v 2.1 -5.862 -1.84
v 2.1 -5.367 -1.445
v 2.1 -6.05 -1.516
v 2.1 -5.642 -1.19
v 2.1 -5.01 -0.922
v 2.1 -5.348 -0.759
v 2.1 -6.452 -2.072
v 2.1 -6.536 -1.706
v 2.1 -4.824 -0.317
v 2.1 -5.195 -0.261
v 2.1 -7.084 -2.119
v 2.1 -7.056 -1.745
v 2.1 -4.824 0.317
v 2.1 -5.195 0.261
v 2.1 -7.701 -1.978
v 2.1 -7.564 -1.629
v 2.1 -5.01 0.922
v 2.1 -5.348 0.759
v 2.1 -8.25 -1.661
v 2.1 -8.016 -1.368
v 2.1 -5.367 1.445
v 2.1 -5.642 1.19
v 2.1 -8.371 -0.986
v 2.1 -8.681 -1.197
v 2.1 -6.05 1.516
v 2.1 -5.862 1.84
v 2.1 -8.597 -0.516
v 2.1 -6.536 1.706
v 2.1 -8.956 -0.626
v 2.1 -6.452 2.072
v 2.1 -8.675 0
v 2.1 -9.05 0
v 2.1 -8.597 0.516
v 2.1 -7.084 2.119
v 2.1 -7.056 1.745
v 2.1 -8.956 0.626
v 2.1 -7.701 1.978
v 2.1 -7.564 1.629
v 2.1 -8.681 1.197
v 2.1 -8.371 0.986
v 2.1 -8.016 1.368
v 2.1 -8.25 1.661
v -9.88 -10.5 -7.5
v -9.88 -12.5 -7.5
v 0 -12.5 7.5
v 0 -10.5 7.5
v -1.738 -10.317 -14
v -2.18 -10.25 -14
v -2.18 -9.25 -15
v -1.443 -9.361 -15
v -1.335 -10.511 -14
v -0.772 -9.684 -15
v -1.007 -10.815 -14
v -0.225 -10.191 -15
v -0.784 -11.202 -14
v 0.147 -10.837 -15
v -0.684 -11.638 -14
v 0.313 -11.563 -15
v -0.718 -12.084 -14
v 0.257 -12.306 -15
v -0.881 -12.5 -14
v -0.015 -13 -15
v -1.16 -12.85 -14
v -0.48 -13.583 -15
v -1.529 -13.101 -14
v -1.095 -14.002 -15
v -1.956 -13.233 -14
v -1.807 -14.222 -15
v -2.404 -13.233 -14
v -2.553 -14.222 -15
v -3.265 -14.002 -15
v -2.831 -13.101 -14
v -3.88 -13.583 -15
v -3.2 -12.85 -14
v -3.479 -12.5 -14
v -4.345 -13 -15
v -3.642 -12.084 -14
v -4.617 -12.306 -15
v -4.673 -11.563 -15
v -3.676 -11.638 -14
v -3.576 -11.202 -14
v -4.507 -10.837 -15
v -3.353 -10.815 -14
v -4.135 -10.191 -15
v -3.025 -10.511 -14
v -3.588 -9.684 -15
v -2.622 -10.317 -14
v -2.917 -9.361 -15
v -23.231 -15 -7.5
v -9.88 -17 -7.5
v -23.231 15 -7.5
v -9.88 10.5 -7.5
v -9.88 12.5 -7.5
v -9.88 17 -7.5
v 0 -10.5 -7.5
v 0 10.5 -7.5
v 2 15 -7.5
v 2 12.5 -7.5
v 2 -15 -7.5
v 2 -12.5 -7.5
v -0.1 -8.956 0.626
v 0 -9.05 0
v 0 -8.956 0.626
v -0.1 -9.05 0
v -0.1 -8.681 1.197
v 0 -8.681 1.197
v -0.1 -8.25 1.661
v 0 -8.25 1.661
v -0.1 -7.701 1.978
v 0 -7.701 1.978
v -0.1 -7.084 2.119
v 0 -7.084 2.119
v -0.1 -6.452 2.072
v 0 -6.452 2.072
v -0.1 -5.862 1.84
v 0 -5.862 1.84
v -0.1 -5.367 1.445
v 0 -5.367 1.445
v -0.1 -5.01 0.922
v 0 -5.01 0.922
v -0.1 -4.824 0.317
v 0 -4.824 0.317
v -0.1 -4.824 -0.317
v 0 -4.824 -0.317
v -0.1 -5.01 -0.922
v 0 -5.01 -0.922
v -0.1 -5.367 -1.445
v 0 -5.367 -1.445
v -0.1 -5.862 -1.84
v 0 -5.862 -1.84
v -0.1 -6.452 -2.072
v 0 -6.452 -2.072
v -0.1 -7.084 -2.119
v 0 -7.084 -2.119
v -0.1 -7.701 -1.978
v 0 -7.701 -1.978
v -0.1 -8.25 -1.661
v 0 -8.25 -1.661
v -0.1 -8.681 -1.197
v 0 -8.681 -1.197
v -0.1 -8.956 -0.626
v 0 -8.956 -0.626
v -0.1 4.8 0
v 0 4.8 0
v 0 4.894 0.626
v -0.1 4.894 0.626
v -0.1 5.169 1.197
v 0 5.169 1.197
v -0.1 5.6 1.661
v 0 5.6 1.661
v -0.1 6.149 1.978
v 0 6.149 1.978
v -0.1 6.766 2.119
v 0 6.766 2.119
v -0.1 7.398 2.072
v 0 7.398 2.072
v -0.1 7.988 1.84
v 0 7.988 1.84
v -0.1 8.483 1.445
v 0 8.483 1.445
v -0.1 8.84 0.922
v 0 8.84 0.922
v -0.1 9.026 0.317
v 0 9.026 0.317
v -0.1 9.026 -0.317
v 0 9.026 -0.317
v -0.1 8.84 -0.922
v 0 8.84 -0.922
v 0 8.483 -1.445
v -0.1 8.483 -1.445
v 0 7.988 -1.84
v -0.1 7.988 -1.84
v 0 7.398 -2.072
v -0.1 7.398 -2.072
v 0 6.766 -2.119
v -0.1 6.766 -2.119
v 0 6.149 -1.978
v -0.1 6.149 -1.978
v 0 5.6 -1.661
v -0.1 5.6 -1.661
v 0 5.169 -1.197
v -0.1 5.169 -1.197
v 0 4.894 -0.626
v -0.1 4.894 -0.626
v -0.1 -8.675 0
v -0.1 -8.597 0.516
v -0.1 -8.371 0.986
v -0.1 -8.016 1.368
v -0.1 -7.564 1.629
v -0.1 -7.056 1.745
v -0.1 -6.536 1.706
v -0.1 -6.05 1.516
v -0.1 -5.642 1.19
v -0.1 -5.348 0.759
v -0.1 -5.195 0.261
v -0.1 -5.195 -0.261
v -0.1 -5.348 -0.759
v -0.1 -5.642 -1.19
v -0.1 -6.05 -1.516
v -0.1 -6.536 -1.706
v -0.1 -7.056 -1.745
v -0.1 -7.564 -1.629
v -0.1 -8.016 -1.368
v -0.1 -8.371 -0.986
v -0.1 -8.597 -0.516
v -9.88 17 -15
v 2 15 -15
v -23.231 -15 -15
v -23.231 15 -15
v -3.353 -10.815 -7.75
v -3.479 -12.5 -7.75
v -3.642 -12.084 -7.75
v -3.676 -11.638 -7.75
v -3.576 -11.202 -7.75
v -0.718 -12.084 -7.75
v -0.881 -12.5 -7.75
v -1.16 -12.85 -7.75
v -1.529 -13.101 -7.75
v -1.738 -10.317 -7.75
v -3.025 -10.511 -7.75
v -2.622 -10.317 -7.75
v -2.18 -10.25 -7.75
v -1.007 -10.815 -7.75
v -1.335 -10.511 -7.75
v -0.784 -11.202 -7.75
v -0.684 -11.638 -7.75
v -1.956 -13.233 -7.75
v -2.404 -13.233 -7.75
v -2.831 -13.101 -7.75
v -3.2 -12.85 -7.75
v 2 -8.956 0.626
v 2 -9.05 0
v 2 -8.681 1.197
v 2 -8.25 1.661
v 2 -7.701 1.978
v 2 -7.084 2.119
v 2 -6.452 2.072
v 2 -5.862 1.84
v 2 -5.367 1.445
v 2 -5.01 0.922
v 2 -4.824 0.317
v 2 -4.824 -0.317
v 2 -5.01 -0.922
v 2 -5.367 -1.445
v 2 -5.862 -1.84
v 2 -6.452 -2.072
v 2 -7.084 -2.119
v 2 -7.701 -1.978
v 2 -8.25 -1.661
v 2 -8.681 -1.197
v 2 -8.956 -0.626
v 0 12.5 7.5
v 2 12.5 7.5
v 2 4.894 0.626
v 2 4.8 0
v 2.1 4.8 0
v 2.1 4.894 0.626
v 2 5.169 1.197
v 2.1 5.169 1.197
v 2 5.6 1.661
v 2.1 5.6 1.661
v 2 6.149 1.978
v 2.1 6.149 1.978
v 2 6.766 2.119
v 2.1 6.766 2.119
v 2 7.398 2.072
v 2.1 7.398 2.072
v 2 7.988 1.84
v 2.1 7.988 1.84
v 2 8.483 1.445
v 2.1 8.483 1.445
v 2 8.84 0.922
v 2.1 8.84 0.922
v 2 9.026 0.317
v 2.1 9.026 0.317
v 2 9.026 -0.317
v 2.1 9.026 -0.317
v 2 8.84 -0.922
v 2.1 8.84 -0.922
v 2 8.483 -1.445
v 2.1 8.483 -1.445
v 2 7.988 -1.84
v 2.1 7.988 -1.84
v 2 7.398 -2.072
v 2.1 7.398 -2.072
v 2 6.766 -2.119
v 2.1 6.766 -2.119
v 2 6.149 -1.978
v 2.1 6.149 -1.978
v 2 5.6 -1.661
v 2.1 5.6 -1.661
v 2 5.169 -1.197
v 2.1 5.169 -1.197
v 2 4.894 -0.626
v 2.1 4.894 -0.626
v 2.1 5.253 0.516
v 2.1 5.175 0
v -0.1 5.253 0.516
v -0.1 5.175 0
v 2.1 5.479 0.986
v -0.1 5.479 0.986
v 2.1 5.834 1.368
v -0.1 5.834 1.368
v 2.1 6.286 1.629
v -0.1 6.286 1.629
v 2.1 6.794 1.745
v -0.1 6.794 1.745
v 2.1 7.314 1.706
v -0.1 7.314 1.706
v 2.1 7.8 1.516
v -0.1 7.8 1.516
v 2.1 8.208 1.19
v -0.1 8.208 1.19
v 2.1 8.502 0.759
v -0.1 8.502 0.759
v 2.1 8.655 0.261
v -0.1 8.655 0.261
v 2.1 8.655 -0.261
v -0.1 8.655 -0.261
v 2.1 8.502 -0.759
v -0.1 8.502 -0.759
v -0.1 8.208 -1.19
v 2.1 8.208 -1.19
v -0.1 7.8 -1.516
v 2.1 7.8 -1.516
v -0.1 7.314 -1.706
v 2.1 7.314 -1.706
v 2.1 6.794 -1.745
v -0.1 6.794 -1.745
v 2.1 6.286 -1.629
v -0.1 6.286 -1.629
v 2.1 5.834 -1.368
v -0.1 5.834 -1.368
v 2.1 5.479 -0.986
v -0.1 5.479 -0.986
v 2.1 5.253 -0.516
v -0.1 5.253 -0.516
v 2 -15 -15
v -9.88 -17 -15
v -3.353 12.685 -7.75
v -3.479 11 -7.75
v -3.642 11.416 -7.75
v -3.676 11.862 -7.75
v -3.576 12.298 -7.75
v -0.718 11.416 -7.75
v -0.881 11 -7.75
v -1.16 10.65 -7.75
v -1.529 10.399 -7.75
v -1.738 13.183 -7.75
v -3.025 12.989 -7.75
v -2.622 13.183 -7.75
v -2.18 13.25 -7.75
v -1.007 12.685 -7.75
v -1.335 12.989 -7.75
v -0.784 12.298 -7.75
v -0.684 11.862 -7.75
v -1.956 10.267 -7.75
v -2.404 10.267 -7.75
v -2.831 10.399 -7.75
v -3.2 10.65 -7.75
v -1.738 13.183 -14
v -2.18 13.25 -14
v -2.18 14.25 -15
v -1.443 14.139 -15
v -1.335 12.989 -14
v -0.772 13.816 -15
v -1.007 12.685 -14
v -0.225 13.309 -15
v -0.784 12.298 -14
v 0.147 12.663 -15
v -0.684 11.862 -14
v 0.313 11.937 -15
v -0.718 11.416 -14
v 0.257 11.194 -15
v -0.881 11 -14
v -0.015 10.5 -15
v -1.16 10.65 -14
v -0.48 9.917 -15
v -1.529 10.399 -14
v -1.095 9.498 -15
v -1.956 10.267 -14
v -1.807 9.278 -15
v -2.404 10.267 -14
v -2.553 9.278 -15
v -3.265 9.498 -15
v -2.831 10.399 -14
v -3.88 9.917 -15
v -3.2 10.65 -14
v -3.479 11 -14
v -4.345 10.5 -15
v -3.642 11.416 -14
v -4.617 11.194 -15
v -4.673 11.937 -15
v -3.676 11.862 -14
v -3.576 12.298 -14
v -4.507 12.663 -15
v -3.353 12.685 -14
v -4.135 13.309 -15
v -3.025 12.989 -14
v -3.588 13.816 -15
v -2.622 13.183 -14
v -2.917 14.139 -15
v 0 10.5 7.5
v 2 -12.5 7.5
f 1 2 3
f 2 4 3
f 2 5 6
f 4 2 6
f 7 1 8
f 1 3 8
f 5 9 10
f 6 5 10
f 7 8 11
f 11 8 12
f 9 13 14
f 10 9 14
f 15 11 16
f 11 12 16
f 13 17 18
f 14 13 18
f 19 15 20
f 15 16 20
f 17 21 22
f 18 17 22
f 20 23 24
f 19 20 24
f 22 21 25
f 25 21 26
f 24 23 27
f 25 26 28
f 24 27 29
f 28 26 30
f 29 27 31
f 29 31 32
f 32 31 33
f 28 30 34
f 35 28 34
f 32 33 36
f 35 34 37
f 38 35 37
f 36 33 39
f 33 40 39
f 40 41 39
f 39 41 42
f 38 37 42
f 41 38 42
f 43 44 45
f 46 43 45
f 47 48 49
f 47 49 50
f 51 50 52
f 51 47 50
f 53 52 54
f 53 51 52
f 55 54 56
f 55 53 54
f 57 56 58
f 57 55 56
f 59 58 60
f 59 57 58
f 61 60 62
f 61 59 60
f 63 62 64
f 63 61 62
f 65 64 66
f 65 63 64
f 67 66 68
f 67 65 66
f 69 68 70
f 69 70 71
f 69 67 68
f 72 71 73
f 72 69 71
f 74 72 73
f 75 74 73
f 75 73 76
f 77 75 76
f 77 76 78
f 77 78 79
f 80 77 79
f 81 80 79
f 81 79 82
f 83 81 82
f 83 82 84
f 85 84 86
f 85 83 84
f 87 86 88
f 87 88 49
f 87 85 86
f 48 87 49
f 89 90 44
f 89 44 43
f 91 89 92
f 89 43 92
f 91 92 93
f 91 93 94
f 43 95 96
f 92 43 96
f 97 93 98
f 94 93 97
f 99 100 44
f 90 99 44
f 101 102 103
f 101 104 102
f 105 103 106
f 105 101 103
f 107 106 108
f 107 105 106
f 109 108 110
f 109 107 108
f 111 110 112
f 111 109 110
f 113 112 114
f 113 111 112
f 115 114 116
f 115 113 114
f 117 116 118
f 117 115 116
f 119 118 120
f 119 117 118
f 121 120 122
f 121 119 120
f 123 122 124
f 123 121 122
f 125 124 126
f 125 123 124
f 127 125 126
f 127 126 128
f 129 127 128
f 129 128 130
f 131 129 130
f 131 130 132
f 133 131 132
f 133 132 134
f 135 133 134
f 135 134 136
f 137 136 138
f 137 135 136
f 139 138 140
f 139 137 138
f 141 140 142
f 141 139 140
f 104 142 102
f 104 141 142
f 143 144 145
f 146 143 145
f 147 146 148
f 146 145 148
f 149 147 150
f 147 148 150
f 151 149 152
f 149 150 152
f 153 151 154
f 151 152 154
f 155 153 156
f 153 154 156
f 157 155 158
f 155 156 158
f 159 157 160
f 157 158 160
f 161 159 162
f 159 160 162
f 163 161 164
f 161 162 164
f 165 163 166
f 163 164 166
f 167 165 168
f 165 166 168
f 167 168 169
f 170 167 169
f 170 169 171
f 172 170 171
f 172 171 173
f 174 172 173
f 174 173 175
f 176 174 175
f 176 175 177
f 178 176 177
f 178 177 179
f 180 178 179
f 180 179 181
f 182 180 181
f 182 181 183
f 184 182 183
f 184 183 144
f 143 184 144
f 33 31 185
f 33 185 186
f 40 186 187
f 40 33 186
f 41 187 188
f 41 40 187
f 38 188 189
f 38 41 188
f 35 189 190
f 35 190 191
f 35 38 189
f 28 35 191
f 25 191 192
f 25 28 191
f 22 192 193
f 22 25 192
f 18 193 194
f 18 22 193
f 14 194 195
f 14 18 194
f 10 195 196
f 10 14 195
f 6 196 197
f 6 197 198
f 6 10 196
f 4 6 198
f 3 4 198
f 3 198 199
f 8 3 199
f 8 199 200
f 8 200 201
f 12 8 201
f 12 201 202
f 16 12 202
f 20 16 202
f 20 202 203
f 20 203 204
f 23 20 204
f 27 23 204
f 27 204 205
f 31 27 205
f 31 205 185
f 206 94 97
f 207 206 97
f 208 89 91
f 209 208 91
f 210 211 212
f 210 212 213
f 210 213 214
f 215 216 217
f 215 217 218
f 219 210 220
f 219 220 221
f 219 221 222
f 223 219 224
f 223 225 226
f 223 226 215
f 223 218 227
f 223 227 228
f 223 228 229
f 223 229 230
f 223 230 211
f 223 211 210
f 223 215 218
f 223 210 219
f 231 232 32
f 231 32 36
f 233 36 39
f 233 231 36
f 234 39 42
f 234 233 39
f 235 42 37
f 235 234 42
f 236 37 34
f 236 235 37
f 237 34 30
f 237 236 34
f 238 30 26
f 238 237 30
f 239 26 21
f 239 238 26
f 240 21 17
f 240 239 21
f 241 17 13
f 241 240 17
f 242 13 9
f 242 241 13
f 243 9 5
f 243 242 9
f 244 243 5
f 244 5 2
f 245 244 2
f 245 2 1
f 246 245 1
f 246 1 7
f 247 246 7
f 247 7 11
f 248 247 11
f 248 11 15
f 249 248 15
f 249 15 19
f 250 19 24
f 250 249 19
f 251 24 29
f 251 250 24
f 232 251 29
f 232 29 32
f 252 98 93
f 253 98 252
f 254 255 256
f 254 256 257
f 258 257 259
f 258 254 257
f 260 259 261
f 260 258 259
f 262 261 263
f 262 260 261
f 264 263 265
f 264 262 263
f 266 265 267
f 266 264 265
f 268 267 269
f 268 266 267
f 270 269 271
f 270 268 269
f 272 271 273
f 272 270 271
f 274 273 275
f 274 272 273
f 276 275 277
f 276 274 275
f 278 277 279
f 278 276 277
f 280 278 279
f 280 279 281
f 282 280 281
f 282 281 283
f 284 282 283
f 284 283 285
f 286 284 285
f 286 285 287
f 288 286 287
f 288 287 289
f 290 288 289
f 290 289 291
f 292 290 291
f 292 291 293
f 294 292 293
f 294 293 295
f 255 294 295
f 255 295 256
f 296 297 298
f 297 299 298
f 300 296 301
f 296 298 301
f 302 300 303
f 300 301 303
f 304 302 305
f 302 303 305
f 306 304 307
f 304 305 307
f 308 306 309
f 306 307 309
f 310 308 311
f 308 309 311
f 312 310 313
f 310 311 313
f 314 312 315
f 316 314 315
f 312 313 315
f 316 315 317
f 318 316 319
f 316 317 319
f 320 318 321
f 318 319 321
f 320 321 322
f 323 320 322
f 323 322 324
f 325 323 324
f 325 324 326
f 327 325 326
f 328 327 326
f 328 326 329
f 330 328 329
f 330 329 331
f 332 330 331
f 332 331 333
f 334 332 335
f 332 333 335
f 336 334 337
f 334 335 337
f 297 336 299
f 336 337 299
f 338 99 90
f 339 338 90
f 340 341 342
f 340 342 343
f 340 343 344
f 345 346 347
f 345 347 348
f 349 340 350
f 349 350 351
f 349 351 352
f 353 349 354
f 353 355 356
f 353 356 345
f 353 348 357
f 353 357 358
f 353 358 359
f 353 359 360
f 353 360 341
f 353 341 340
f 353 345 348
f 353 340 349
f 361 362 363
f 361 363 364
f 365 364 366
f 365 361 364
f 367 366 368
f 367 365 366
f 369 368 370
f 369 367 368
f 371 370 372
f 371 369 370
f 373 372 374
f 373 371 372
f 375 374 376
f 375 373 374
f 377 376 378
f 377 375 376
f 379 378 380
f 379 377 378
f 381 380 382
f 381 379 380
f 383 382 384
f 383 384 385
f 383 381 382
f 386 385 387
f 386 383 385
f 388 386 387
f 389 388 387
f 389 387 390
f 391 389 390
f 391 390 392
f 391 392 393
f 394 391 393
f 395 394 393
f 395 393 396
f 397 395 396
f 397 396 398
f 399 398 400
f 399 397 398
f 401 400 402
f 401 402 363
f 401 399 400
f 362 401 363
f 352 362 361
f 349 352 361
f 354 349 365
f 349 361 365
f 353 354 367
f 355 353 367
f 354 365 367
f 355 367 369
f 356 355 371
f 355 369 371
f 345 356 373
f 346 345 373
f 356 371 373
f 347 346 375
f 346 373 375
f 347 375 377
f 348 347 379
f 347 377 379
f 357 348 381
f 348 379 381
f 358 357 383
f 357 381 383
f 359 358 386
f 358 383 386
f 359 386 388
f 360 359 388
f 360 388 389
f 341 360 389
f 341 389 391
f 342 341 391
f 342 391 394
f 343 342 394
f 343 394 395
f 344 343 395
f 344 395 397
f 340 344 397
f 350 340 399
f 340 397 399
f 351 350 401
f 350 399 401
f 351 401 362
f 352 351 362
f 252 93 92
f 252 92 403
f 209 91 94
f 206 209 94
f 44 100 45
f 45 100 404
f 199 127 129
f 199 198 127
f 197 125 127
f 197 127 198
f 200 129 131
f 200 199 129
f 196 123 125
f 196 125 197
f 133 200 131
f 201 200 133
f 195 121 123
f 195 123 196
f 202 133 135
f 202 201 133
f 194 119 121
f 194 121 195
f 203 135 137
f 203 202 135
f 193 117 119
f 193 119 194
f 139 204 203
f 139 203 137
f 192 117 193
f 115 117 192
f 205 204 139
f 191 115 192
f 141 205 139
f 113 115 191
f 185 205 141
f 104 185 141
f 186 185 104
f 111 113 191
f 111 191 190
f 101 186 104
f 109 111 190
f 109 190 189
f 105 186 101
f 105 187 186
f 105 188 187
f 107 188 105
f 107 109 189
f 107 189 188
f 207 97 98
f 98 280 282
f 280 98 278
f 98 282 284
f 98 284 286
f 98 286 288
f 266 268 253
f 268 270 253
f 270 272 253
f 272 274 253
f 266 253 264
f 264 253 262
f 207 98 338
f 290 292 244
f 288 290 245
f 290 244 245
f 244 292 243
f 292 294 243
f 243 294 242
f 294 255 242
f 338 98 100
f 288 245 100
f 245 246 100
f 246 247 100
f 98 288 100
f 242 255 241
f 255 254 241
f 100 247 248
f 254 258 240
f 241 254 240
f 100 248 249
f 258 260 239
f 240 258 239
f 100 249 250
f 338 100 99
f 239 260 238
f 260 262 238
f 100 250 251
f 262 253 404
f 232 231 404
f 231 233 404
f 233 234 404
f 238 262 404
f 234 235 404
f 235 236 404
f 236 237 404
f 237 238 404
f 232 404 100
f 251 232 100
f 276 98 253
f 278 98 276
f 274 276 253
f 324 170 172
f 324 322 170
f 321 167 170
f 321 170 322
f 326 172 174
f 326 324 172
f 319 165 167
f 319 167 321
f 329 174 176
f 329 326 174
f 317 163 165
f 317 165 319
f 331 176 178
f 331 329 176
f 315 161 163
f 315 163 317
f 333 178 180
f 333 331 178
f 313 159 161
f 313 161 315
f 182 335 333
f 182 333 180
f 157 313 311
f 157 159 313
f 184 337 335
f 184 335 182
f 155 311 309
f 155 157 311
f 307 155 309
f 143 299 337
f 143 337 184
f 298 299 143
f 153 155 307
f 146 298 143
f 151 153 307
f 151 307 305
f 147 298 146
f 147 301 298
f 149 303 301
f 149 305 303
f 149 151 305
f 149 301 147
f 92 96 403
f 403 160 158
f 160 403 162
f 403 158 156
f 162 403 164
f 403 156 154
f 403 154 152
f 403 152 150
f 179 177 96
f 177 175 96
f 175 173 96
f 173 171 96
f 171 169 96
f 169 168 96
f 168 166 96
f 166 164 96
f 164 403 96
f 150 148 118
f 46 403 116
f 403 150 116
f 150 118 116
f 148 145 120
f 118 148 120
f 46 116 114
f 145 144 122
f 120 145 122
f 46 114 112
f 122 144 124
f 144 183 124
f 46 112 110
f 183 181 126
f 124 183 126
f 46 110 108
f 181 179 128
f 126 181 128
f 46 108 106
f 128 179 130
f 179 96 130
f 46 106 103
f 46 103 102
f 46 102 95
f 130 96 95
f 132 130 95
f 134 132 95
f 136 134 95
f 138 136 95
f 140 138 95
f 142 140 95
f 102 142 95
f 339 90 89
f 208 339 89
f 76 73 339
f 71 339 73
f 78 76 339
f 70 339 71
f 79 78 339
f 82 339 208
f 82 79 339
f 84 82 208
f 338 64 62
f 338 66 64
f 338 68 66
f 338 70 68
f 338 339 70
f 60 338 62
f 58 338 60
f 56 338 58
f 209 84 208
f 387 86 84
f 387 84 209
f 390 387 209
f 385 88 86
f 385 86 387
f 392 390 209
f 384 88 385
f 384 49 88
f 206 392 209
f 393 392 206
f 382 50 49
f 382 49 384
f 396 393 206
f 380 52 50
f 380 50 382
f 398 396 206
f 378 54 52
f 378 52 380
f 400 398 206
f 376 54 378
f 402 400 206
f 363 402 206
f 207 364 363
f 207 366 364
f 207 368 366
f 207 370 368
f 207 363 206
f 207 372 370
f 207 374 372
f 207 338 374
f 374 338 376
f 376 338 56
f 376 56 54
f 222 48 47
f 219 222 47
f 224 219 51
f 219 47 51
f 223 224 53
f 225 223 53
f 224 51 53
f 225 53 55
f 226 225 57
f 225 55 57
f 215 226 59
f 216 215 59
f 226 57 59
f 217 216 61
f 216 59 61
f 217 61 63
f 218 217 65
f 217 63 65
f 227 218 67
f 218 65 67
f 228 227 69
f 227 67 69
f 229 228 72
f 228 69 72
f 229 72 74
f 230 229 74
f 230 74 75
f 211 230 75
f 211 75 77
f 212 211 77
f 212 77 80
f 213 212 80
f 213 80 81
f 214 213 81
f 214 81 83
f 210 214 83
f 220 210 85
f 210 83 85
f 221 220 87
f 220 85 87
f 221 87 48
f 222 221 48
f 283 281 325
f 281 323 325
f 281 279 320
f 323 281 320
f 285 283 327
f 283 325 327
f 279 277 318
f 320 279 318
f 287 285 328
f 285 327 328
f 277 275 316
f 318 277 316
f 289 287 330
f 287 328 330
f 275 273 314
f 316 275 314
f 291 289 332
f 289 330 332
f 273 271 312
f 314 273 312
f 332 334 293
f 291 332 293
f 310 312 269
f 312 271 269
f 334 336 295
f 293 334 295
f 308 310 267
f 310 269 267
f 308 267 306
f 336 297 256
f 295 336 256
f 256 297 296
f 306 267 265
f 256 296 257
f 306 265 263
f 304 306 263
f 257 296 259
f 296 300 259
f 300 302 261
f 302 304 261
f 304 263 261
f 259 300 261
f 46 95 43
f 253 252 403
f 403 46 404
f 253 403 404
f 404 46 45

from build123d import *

# Parameters (mm, degrees)
SKETCH030_W             = 25
SKETCH030_H             = 15
PAD007_DEPTH            = 2
PAD008_DEPTH            = 7.5
SKETCH032_R             = 1.5
POCKET007_DEPTH         = 7.25
SKETCH031_R             = 1.75
POCKET008_DEPTH         = 5
PAD009_DEPTH            = 2
CHAMFER005_SIZE         = 1
SKETCH035_R             = 2.125
SKETCH035_R_2           = 1.75
PAD010_DEPTH            = 1.1
BODY003_PLACEMENT_ANGLE = 180


with BuildPart() as part:
    # Sketch030 → Pad007 (new body)
    with BuildSketch(Plane.YZ):
        Rectangle(SKETCH030_W, SKETCH030_H)
    extrude(amount=PAD007_DEPTH)

    # Sketch033 (on Face4 of Pad007) → Pad008 (join)
    with BuildSketch(Plane(origin=(0, 0, 7.5), x_dir=(0, -1, 0), z_dir=(0, 0, 1))):
        Polygon((-15, -23.23103), (15, -23.23103), (17, -9.88), (15, 2), (-15, 2), (-17, -9.88), align=None)
    extrude(amount=PAD008_DEPTH)

    # Sketch032 (on Face13 of Pad008) → Pocket007 (cut)
    with BuildSketch(Plane(origin=(0, 0, 15), x_dir=(0, -1, 0), z_dir=(0, 0, 1))):
        with Locations((11.75, -2.18)):
            Circle(SKETCH032_R)
        with Locations((-11.75, -2.18)):
            Circle(SKETCH032_R)
    extrude(amount=-POCKET007_DEPTH, mode=Mode.SUBTRACT)

    # Sketch031 (on Face4 of Pad008) → Pocket008 (cut)
    with BuildSketch(Plane(origin=(0, 0, 0), x_dir=(0, 1, 0), z_dir=(-1, 0, 0))):
        with Locations((-6.925, 0)):
            Circle(SKETCH031_R)
        with Locations((6.925, 0)):
            Circle(SKETCH031_R)
    extrude(amount=-POCKET008_DEPTH, mode=Mode.SUBTRACT)

    # Sketch034 (on Face1 of Pocket008) → Pad009 (join)
    with BuildSketch(Plane(origin=(0, -12.5, 0), x_dir=(0, 0, -1), z_dir=(0, -1, 0))):
        Polygon((-7.5, -9.88), (7.5, 0), (-7.5, 0), align=None)
    pad009 = extrude(amount=-PAD009_DEPTH)

    # Mirrored001: Pad009 across XZ
    add(pad009.mirror(Plane.XZ))

    # Chamfer005
    chamfer005_edges = [part.edges().sort_by_distance(p)[0] for p in [
        (-2.18, 13.25, 15),
        (-2.18, -10.25, 15),
    ]]
    chamfer(chamfer005_edges, length=CHAMFER005_SIZE)

    # Sketch035 (on Face19 of Chamfer005) → Pad010 (join, symmetric)
    with BuildSketch(Plane(origin=(1, 0, 0), x_dir=(0, 1, 0), z_dir=(-1, 0, 0))):
        with Locations((-6.925, 0)):
            Circle(SKETCH035_R)
        with Locations((-6.925, 0)):
            Circle(SKETCH035_R_2, mode=Mode.SUBTRACT)
        with Locations((6.925, 0)):
            Circle(SKETCH035_R)
        with Locations((6.925, 0)):
            Circle(SKETCH035_R_2, mode=Mode.SUBTRACT)
    extrude(amount=PAD010_DEPTH, both=True)


with BuildPart() as part_1:
    # Body003 placement: moved
    add(part.part.rotate(Axis((0, 0, 0), (1, 0, 0)), BODY003_PLACEMENT_ANGLE))


solid = part_1.part
